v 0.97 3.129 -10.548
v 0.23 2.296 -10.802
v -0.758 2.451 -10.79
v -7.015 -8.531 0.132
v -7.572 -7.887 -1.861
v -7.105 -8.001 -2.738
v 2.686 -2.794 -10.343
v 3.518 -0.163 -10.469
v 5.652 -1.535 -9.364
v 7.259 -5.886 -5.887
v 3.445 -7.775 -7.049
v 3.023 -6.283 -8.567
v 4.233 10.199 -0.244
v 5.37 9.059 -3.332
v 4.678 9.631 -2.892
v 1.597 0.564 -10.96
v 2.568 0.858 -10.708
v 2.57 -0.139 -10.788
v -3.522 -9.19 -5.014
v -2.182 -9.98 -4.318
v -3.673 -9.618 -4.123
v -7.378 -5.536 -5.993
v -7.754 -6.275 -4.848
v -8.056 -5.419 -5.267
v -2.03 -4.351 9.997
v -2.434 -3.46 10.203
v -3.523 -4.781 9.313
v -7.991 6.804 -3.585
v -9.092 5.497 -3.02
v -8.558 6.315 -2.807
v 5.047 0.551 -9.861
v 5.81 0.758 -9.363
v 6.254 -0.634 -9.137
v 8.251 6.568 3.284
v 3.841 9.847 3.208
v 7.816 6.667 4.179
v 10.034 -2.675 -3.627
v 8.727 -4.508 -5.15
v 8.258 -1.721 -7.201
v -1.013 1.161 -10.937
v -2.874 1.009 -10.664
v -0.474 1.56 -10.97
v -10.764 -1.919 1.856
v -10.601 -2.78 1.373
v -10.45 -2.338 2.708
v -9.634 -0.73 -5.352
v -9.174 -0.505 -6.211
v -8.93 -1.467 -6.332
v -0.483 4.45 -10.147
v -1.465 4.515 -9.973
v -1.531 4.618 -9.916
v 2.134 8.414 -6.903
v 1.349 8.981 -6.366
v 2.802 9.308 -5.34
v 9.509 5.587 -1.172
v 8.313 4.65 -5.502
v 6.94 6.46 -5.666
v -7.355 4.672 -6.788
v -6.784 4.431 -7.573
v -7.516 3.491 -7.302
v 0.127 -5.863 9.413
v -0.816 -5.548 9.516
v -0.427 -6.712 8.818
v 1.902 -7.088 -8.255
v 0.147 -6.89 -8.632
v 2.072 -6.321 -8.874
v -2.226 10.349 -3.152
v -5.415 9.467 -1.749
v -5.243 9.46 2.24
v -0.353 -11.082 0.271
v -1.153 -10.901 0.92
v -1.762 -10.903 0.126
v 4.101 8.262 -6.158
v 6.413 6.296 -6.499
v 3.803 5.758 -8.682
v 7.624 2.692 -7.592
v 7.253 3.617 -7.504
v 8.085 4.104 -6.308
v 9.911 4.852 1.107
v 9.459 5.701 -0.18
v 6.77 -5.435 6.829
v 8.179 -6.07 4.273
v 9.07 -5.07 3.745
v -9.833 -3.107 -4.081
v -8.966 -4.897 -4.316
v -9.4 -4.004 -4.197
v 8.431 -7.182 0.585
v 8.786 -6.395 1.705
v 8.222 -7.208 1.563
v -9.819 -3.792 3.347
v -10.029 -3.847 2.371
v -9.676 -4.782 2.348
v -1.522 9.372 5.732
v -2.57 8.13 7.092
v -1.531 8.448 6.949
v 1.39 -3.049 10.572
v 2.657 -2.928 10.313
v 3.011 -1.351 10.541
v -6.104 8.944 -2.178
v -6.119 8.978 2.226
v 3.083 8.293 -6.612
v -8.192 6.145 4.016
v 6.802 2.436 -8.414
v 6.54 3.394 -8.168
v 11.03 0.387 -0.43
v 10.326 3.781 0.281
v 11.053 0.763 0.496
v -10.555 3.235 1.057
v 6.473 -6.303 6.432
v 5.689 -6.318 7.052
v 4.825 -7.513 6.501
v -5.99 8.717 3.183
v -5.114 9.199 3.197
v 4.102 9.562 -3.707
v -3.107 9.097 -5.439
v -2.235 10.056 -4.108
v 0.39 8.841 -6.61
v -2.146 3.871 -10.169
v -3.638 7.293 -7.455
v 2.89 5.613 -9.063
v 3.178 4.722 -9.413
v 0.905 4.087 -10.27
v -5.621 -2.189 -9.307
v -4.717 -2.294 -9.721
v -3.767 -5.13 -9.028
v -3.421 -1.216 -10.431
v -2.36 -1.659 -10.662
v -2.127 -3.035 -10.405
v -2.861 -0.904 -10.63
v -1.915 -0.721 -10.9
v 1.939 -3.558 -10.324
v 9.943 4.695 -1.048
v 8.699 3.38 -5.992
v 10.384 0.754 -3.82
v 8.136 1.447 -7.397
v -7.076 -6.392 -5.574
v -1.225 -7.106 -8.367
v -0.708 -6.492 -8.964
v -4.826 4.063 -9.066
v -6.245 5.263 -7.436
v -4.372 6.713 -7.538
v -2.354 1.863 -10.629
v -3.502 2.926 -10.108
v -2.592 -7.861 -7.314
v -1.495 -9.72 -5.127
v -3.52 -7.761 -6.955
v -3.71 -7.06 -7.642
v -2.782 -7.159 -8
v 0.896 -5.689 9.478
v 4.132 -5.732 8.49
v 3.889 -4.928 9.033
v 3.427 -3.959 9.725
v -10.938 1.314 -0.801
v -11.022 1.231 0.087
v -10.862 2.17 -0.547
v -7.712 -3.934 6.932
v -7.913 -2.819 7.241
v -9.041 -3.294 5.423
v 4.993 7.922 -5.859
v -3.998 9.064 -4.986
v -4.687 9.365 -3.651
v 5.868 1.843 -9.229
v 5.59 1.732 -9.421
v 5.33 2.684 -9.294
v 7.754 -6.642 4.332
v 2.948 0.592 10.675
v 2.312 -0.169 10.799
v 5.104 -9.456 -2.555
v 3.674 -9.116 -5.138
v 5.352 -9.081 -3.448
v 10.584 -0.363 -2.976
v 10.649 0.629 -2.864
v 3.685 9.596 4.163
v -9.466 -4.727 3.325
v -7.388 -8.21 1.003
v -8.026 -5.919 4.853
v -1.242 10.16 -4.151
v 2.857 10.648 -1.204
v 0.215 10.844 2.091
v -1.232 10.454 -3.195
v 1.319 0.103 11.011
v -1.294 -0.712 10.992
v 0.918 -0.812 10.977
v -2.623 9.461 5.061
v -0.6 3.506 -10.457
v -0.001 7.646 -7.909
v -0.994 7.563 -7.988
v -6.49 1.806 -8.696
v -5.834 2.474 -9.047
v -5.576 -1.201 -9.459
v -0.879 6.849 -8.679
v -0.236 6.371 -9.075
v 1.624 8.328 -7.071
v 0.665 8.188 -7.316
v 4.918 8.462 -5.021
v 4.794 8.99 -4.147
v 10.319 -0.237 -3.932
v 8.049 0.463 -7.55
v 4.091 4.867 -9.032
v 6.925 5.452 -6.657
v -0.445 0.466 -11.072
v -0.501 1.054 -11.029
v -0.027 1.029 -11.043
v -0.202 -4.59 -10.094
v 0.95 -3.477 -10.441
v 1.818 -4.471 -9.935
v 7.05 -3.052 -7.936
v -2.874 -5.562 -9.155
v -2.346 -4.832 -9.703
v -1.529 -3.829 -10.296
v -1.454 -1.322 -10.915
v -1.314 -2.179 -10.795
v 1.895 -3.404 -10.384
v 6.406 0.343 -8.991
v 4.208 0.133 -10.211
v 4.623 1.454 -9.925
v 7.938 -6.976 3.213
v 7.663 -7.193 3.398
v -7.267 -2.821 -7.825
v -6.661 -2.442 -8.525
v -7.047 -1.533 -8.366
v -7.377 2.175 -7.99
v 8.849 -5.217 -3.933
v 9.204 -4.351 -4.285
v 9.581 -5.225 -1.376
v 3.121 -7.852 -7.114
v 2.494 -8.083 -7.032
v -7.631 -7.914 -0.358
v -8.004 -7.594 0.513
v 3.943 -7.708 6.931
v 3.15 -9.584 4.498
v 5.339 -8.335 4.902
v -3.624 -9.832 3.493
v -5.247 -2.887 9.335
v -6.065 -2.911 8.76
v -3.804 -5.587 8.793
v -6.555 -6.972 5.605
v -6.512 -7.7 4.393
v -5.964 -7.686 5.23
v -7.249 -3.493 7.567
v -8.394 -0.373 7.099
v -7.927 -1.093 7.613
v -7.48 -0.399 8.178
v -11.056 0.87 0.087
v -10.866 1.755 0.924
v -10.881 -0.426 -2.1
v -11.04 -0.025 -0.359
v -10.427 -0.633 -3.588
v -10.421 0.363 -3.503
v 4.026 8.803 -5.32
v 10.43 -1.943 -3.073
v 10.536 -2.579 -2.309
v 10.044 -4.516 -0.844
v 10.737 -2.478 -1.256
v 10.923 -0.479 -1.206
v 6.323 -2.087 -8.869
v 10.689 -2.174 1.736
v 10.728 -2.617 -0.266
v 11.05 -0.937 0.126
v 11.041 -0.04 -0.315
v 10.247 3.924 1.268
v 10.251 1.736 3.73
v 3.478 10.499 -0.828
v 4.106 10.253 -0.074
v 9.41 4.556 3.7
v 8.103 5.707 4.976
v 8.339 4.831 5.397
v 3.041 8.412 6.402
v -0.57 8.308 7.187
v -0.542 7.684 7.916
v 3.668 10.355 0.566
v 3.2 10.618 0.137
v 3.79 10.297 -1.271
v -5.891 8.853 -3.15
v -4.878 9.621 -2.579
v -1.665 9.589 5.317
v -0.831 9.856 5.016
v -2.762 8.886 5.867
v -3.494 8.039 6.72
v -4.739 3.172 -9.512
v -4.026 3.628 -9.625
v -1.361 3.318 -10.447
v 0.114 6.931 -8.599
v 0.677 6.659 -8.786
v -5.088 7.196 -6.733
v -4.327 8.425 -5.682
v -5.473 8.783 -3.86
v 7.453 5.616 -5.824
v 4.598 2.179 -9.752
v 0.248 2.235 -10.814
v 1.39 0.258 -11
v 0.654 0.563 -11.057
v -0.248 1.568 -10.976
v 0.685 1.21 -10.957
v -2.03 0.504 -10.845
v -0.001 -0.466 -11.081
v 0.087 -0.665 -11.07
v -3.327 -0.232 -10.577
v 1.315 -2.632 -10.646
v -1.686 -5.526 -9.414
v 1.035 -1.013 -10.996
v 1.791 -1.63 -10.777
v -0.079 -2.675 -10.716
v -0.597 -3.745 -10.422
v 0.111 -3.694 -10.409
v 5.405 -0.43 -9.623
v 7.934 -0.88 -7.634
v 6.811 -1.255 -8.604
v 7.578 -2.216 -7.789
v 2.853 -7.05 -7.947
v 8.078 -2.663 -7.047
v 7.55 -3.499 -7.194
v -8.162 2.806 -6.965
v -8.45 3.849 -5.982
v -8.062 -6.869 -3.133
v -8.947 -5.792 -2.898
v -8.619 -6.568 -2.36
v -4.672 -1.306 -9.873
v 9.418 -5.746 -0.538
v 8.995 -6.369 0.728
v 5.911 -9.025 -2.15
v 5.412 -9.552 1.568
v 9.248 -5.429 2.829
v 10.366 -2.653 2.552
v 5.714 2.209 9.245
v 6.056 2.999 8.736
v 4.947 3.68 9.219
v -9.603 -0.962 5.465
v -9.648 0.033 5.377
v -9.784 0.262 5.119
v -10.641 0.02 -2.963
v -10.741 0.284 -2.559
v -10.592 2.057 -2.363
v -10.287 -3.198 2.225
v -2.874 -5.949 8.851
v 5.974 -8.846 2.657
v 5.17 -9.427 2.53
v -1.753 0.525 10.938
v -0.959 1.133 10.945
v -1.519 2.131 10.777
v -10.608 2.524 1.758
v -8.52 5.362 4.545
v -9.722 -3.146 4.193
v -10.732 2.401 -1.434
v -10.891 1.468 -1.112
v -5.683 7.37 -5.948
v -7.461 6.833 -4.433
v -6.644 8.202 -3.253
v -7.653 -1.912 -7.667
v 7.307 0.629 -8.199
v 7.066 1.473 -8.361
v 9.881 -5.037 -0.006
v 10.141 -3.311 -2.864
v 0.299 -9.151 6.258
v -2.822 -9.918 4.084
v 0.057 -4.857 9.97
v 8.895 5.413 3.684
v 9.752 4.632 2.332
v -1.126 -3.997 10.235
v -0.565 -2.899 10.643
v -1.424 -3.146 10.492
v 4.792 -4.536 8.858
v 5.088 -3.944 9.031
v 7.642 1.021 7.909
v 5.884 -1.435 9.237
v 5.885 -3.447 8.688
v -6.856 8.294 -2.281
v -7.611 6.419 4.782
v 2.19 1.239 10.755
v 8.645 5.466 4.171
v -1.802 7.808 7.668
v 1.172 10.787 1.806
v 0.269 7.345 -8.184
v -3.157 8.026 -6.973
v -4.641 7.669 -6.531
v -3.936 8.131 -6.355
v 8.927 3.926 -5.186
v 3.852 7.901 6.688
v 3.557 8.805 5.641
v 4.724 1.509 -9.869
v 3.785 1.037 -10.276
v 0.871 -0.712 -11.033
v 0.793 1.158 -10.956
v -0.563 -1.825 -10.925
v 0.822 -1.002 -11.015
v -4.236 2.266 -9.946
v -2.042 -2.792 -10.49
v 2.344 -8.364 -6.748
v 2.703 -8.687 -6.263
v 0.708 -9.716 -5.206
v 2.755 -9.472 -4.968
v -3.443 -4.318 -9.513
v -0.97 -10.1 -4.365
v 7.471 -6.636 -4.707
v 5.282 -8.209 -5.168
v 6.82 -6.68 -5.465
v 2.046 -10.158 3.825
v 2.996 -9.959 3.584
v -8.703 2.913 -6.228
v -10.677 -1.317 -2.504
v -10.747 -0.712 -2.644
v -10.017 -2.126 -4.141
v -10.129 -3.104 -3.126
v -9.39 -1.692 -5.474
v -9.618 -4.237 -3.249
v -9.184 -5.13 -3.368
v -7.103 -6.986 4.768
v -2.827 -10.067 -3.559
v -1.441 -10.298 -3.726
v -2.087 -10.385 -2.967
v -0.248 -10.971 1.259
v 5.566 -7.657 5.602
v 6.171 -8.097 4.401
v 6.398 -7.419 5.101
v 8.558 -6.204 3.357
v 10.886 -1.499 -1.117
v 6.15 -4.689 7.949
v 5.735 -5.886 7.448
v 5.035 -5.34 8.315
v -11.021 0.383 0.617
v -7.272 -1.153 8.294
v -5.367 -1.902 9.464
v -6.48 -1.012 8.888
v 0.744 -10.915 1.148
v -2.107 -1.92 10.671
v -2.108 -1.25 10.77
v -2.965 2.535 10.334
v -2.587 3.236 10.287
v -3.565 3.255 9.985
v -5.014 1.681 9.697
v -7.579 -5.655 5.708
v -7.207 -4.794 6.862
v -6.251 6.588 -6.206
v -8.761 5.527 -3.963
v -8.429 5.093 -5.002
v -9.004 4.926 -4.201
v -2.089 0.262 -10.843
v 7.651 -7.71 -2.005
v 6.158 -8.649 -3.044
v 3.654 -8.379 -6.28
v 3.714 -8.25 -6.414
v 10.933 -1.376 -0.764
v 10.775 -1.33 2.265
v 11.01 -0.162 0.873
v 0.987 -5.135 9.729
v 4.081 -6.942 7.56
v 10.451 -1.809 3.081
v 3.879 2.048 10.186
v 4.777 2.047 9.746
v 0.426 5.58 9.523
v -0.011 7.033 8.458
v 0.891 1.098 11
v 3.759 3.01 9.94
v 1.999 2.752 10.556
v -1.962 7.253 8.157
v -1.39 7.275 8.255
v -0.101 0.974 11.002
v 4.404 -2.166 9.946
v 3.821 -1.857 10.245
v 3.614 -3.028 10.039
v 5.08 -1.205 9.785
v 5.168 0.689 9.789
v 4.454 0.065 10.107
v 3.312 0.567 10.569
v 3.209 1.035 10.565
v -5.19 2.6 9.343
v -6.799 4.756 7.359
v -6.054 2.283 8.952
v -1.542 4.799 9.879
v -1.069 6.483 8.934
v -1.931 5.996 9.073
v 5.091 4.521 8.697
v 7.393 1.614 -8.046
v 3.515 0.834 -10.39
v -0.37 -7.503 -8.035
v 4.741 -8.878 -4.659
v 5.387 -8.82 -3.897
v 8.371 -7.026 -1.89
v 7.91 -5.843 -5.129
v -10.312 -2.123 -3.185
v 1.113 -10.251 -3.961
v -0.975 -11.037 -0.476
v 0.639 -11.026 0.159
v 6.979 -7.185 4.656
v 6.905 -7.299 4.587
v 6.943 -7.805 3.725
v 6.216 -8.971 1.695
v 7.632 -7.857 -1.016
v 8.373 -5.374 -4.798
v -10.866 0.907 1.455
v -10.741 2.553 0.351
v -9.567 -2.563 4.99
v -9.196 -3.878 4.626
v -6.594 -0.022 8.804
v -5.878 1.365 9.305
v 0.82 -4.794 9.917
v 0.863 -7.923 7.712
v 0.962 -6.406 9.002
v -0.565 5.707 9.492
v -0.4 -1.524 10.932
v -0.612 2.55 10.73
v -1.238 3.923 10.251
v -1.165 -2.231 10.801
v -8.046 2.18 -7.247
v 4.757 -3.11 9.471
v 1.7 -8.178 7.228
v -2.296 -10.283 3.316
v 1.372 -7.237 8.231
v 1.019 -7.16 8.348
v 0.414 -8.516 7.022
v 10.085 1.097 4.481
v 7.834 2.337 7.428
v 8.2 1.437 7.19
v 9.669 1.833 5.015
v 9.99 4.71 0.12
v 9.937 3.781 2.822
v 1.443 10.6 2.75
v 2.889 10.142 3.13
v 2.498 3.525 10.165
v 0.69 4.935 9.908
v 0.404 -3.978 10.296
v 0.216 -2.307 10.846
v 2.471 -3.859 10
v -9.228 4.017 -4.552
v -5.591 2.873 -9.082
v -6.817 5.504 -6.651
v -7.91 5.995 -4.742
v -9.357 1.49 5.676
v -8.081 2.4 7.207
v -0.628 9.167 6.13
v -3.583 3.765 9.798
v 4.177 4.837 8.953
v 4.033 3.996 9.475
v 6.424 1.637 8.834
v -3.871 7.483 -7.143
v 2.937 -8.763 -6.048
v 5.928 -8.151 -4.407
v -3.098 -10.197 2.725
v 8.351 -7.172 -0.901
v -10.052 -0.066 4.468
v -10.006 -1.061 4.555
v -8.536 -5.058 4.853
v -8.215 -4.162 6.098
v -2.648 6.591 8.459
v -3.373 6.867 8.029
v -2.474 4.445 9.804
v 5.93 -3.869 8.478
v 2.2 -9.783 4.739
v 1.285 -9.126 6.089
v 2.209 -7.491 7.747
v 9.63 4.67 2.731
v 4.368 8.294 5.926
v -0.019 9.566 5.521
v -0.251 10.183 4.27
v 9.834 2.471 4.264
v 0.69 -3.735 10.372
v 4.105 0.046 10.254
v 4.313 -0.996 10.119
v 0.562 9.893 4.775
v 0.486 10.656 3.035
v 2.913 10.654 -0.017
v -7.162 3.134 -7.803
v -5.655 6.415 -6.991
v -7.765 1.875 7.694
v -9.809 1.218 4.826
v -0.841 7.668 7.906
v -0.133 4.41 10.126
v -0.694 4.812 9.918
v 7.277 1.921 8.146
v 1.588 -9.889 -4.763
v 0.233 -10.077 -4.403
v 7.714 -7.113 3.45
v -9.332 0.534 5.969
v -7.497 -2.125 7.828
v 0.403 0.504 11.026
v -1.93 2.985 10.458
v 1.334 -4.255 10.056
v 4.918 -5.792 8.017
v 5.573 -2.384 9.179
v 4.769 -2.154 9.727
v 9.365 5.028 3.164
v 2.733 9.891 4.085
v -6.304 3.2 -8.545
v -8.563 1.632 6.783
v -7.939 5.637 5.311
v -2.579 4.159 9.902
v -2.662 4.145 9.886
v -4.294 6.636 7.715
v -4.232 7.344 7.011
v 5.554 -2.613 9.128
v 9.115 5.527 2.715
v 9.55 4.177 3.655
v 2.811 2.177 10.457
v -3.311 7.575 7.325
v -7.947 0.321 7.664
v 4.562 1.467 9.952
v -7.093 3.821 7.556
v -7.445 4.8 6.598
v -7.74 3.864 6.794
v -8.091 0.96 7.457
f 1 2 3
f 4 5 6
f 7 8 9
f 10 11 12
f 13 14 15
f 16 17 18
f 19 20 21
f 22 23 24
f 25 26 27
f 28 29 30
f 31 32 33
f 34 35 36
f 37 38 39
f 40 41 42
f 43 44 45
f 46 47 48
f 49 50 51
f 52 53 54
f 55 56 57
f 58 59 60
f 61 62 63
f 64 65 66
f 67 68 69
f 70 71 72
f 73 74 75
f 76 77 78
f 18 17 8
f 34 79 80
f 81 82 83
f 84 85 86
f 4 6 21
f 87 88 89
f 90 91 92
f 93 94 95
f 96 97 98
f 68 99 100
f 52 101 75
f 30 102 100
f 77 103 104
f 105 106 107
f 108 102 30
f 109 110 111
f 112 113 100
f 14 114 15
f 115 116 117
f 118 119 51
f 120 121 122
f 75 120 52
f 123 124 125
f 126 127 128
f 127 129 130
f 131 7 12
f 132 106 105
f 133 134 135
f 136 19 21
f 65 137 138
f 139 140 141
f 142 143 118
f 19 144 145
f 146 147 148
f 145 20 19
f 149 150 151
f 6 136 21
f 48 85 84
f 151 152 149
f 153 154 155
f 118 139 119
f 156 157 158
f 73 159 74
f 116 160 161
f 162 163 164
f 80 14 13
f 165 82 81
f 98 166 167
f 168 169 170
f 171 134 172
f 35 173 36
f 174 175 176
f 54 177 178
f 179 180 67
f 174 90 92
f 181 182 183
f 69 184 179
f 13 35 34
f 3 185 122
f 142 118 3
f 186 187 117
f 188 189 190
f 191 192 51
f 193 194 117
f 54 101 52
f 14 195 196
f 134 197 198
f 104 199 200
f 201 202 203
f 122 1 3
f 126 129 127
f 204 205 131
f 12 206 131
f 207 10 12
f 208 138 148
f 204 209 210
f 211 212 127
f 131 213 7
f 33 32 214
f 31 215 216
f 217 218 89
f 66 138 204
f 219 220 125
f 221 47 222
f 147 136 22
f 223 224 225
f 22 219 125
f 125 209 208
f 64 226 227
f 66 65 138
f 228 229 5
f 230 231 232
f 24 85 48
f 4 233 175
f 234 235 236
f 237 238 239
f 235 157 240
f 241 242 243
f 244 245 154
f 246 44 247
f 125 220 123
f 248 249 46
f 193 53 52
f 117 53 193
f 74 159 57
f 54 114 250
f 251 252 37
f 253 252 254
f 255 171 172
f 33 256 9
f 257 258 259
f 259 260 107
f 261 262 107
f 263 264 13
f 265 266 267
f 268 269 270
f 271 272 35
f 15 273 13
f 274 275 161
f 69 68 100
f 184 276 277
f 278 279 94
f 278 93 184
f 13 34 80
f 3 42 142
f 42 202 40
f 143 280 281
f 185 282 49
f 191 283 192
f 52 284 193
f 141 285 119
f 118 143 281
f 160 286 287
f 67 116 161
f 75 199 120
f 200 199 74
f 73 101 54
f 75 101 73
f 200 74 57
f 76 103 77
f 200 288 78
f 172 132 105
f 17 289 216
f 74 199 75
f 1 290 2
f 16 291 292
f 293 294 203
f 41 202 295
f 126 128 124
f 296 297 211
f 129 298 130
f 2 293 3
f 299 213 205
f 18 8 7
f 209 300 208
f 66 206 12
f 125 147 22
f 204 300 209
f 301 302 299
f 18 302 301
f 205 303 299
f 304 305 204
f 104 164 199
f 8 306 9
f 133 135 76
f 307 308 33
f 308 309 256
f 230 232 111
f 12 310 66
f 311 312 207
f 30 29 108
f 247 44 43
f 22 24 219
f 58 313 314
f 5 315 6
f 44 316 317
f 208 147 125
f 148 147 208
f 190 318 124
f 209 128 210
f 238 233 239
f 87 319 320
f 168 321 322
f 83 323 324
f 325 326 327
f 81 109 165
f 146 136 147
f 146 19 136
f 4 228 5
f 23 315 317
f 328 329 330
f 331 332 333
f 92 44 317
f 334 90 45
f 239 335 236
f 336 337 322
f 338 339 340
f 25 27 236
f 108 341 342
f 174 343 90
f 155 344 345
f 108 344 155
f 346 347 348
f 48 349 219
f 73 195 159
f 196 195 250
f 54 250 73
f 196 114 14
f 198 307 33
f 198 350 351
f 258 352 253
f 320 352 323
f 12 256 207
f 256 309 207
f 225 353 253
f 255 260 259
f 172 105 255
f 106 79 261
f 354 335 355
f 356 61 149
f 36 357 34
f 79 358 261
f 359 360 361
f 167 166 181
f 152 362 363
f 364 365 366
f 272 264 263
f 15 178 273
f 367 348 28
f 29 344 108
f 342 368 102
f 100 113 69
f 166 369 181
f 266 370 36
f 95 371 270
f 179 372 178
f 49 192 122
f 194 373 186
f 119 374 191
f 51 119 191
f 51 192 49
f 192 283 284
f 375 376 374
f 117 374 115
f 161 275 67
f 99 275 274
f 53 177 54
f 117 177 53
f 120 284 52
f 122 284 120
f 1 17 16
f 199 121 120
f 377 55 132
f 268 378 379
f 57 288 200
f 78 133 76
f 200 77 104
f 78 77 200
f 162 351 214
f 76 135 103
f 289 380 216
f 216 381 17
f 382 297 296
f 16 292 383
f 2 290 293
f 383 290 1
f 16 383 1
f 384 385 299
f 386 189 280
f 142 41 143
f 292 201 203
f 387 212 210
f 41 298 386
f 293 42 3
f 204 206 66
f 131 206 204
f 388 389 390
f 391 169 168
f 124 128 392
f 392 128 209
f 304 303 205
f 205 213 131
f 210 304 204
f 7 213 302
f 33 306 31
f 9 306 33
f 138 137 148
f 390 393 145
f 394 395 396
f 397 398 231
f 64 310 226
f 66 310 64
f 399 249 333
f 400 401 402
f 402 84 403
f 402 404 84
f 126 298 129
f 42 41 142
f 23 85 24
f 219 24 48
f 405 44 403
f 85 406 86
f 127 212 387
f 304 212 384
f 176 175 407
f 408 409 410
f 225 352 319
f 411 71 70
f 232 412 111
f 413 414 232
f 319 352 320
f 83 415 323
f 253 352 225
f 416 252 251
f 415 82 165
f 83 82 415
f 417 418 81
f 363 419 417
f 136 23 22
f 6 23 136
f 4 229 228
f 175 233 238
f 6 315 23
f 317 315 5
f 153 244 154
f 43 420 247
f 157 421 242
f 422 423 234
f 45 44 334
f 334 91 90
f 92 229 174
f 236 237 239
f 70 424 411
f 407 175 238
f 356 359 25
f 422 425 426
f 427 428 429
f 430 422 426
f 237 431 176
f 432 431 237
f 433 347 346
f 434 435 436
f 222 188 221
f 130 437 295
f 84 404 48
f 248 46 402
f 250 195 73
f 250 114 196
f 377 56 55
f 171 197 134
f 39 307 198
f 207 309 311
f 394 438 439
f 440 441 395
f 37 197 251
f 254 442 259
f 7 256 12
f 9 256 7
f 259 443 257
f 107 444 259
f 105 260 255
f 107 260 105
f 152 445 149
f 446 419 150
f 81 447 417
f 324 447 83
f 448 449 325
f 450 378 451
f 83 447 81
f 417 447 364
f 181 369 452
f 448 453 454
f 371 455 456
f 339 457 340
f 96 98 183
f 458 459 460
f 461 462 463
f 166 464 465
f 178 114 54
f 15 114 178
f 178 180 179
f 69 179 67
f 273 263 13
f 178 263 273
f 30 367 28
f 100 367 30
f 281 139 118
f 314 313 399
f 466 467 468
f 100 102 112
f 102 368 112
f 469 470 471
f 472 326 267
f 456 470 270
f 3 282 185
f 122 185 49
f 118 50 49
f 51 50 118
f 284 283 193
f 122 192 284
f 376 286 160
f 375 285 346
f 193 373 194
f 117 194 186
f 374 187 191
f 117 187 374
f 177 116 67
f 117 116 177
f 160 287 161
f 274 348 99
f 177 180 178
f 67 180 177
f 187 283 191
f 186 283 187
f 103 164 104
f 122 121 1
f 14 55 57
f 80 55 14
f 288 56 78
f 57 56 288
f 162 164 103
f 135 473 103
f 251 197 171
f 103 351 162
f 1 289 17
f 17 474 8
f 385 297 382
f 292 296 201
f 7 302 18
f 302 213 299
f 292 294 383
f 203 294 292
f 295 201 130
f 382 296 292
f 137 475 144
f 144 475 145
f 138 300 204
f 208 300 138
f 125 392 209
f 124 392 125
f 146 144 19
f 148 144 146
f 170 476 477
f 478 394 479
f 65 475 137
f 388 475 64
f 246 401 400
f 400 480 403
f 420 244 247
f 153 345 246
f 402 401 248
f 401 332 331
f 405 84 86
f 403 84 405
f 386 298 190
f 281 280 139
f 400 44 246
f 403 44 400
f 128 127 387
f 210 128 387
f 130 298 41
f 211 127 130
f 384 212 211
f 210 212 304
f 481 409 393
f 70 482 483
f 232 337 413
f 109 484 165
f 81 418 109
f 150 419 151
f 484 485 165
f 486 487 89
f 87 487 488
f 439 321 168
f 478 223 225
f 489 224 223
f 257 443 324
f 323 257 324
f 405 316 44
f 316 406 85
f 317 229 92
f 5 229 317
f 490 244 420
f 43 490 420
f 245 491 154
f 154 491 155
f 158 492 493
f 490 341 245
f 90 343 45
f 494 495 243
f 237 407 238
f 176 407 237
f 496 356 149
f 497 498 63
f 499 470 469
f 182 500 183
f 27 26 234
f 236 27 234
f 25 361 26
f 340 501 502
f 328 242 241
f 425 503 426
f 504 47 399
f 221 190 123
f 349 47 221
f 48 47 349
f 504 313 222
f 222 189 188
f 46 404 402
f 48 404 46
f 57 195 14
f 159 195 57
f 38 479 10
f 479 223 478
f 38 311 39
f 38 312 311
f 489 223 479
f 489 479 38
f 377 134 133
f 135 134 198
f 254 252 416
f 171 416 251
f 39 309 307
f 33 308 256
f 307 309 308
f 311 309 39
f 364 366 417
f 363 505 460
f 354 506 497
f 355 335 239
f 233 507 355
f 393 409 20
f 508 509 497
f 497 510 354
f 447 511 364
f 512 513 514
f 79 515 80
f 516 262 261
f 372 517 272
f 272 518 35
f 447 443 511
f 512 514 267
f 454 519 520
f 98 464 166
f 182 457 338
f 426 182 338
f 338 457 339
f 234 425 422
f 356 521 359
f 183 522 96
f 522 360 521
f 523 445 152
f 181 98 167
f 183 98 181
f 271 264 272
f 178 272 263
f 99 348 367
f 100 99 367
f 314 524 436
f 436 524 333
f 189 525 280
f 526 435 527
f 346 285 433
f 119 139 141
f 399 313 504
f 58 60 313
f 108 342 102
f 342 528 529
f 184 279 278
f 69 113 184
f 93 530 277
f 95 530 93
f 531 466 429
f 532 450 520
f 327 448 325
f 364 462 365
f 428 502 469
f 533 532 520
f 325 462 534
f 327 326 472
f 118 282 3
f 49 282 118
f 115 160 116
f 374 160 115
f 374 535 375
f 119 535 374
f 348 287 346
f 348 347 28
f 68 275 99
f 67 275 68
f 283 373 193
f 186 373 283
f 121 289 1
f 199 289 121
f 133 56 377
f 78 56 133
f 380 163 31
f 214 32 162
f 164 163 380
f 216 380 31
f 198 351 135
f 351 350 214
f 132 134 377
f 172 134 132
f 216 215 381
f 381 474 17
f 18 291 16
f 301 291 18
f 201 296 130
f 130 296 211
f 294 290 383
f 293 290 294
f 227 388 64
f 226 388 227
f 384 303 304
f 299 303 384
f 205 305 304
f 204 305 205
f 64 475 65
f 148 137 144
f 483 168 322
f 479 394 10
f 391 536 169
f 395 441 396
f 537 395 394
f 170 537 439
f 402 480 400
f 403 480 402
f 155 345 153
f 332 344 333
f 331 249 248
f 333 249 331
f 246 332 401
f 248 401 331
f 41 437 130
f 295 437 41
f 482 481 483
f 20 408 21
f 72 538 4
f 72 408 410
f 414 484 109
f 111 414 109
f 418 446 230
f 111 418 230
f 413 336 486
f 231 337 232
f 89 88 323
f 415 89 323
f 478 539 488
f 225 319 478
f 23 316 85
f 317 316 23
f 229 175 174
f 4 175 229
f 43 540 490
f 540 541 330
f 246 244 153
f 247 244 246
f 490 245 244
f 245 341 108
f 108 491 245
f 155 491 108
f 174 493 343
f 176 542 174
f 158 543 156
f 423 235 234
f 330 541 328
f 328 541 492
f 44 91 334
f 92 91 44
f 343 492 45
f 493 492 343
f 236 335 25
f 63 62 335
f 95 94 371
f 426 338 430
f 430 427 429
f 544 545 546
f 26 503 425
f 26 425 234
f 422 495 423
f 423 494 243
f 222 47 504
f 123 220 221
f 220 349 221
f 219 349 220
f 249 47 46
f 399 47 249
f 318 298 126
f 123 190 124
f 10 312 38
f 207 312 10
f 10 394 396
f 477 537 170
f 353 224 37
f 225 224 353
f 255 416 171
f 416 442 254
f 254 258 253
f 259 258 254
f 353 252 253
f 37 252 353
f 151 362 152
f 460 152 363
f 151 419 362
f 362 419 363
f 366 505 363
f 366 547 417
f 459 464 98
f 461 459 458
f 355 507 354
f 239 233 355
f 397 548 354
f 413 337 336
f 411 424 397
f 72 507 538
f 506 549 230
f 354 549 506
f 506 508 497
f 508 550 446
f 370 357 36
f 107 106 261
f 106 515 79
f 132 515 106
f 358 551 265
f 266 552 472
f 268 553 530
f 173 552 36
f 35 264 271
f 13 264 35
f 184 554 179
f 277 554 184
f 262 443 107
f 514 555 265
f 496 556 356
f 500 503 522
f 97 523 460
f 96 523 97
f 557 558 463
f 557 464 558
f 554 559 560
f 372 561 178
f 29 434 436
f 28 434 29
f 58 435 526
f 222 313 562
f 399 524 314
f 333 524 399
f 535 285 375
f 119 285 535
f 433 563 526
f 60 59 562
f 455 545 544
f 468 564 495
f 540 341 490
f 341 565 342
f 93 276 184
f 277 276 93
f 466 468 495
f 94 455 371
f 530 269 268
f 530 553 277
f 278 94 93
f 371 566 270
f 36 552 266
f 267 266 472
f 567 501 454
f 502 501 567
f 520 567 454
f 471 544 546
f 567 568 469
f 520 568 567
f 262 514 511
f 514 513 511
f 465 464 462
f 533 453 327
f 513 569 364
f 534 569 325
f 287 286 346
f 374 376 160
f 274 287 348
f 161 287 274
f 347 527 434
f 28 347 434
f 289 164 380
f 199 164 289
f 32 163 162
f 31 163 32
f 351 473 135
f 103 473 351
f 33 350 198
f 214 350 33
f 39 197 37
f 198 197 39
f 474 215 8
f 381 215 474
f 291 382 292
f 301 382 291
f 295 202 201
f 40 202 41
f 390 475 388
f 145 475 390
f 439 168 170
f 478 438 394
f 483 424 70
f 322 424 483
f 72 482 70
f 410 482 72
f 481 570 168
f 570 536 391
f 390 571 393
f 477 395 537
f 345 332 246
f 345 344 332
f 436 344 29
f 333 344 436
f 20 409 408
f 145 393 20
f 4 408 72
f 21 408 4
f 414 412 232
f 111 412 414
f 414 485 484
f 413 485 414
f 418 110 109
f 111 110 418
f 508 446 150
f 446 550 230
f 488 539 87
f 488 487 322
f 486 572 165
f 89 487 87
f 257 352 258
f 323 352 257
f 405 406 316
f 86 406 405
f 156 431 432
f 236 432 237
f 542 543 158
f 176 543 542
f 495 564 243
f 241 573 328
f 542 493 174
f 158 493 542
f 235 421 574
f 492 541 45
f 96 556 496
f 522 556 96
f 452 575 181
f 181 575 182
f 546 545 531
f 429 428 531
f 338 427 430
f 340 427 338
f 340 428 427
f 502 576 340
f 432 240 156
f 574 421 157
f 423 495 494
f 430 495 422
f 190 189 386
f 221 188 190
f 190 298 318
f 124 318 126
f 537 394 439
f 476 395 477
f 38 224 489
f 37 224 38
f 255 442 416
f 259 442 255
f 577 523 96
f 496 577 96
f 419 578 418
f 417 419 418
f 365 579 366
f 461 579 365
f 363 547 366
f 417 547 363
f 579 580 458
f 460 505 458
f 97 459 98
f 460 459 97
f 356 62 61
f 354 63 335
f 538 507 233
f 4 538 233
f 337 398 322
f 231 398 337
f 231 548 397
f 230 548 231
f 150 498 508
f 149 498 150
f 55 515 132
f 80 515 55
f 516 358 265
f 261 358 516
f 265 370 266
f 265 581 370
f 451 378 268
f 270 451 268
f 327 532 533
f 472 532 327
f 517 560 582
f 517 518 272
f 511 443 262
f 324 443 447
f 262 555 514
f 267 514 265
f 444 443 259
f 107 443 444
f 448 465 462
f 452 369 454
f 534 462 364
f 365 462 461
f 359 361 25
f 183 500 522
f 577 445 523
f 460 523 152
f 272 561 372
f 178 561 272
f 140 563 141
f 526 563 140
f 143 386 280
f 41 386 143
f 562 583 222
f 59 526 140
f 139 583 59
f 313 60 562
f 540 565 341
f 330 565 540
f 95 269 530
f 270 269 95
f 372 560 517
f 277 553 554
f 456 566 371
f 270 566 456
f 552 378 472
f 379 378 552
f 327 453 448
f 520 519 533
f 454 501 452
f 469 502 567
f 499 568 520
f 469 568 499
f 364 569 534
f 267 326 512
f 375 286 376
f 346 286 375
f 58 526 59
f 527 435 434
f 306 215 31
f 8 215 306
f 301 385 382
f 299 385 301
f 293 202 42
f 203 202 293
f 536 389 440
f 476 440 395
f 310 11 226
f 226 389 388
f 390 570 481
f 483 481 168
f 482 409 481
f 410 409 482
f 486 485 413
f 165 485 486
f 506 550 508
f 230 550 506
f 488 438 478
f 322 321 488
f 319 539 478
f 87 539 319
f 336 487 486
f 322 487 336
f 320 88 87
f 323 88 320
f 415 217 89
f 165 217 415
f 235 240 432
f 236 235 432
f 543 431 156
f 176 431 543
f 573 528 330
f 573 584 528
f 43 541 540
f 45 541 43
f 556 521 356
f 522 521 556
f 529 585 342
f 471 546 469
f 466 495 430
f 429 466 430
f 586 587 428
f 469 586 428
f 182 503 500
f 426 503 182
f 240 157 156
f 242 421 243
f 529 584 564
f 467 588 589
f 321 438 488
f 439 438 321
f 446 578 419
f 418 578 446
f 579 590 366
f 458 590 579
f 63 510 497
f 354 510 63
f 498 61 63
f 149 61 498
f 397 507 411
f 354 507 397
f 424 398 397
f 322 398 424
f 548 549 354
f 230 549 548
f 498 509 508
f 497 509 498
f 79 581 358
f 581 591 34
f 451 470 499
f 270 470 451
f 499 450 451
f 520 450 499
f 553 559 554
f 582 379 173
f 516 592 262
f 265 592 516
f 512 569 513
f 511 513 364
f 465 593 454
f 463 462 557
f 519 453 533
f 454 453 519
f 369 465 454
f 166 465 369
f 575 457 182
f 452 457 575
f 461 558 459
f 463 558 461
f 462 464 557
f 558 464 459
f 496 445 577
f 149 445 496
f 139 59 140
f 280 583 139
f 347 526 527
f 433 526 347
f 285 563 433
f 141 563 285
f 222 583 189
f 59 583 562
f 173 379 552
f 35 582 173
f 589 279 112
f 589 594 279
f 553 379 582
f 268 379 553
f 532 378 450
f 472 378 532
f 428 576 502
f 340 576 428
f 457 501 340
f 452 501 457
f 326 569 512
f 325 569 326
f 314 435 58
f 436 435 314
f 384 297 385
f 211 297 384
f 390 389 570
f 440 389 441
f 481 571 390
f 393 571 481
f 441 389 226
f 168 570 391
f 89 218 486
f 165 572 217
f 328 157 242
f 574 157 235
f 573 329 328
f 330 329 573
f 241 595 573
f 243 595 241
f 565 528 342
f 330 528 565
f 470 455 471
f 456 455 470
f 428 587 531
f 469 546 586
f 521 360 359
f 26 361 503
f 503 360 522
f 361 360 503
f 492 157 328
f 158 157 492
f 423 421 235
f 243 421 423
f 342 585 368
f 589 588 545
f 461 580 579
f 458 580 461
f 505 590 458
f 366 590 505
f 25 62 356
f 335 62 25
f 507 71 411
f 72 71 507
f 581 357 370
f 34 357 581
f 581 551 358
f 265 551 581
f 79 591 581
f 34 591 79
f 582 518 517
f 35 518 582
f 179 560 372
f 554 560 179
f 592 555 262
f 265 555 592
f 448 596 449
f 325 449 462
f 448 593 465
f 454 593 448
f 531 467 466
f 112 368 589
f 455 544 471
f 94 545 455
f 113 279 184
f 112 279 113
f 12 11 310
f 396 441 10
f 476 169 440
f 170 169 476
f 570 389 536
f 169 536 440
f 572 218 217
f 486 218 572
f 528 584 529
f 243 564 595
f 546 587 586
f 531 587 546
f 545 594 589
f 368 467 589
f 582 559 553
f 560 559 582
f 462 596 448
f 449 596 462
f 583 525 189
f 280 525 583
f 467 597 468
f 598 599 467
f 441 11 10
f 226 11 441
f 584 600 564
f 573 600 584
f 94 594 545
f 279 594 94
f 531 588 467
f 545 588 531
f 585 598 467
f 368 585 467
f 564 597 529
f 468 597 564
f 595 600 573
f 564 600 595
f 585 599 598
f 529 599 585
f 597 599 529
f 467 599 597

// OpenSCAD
points=600;
random_angles=rands(0,360,points,42);

hull()
  for(i=[0:3:points-1])
    rotate([random_angles[i],random_angles[i+1],random_angles[i+2]]) translate([10,0,0]) cube();
